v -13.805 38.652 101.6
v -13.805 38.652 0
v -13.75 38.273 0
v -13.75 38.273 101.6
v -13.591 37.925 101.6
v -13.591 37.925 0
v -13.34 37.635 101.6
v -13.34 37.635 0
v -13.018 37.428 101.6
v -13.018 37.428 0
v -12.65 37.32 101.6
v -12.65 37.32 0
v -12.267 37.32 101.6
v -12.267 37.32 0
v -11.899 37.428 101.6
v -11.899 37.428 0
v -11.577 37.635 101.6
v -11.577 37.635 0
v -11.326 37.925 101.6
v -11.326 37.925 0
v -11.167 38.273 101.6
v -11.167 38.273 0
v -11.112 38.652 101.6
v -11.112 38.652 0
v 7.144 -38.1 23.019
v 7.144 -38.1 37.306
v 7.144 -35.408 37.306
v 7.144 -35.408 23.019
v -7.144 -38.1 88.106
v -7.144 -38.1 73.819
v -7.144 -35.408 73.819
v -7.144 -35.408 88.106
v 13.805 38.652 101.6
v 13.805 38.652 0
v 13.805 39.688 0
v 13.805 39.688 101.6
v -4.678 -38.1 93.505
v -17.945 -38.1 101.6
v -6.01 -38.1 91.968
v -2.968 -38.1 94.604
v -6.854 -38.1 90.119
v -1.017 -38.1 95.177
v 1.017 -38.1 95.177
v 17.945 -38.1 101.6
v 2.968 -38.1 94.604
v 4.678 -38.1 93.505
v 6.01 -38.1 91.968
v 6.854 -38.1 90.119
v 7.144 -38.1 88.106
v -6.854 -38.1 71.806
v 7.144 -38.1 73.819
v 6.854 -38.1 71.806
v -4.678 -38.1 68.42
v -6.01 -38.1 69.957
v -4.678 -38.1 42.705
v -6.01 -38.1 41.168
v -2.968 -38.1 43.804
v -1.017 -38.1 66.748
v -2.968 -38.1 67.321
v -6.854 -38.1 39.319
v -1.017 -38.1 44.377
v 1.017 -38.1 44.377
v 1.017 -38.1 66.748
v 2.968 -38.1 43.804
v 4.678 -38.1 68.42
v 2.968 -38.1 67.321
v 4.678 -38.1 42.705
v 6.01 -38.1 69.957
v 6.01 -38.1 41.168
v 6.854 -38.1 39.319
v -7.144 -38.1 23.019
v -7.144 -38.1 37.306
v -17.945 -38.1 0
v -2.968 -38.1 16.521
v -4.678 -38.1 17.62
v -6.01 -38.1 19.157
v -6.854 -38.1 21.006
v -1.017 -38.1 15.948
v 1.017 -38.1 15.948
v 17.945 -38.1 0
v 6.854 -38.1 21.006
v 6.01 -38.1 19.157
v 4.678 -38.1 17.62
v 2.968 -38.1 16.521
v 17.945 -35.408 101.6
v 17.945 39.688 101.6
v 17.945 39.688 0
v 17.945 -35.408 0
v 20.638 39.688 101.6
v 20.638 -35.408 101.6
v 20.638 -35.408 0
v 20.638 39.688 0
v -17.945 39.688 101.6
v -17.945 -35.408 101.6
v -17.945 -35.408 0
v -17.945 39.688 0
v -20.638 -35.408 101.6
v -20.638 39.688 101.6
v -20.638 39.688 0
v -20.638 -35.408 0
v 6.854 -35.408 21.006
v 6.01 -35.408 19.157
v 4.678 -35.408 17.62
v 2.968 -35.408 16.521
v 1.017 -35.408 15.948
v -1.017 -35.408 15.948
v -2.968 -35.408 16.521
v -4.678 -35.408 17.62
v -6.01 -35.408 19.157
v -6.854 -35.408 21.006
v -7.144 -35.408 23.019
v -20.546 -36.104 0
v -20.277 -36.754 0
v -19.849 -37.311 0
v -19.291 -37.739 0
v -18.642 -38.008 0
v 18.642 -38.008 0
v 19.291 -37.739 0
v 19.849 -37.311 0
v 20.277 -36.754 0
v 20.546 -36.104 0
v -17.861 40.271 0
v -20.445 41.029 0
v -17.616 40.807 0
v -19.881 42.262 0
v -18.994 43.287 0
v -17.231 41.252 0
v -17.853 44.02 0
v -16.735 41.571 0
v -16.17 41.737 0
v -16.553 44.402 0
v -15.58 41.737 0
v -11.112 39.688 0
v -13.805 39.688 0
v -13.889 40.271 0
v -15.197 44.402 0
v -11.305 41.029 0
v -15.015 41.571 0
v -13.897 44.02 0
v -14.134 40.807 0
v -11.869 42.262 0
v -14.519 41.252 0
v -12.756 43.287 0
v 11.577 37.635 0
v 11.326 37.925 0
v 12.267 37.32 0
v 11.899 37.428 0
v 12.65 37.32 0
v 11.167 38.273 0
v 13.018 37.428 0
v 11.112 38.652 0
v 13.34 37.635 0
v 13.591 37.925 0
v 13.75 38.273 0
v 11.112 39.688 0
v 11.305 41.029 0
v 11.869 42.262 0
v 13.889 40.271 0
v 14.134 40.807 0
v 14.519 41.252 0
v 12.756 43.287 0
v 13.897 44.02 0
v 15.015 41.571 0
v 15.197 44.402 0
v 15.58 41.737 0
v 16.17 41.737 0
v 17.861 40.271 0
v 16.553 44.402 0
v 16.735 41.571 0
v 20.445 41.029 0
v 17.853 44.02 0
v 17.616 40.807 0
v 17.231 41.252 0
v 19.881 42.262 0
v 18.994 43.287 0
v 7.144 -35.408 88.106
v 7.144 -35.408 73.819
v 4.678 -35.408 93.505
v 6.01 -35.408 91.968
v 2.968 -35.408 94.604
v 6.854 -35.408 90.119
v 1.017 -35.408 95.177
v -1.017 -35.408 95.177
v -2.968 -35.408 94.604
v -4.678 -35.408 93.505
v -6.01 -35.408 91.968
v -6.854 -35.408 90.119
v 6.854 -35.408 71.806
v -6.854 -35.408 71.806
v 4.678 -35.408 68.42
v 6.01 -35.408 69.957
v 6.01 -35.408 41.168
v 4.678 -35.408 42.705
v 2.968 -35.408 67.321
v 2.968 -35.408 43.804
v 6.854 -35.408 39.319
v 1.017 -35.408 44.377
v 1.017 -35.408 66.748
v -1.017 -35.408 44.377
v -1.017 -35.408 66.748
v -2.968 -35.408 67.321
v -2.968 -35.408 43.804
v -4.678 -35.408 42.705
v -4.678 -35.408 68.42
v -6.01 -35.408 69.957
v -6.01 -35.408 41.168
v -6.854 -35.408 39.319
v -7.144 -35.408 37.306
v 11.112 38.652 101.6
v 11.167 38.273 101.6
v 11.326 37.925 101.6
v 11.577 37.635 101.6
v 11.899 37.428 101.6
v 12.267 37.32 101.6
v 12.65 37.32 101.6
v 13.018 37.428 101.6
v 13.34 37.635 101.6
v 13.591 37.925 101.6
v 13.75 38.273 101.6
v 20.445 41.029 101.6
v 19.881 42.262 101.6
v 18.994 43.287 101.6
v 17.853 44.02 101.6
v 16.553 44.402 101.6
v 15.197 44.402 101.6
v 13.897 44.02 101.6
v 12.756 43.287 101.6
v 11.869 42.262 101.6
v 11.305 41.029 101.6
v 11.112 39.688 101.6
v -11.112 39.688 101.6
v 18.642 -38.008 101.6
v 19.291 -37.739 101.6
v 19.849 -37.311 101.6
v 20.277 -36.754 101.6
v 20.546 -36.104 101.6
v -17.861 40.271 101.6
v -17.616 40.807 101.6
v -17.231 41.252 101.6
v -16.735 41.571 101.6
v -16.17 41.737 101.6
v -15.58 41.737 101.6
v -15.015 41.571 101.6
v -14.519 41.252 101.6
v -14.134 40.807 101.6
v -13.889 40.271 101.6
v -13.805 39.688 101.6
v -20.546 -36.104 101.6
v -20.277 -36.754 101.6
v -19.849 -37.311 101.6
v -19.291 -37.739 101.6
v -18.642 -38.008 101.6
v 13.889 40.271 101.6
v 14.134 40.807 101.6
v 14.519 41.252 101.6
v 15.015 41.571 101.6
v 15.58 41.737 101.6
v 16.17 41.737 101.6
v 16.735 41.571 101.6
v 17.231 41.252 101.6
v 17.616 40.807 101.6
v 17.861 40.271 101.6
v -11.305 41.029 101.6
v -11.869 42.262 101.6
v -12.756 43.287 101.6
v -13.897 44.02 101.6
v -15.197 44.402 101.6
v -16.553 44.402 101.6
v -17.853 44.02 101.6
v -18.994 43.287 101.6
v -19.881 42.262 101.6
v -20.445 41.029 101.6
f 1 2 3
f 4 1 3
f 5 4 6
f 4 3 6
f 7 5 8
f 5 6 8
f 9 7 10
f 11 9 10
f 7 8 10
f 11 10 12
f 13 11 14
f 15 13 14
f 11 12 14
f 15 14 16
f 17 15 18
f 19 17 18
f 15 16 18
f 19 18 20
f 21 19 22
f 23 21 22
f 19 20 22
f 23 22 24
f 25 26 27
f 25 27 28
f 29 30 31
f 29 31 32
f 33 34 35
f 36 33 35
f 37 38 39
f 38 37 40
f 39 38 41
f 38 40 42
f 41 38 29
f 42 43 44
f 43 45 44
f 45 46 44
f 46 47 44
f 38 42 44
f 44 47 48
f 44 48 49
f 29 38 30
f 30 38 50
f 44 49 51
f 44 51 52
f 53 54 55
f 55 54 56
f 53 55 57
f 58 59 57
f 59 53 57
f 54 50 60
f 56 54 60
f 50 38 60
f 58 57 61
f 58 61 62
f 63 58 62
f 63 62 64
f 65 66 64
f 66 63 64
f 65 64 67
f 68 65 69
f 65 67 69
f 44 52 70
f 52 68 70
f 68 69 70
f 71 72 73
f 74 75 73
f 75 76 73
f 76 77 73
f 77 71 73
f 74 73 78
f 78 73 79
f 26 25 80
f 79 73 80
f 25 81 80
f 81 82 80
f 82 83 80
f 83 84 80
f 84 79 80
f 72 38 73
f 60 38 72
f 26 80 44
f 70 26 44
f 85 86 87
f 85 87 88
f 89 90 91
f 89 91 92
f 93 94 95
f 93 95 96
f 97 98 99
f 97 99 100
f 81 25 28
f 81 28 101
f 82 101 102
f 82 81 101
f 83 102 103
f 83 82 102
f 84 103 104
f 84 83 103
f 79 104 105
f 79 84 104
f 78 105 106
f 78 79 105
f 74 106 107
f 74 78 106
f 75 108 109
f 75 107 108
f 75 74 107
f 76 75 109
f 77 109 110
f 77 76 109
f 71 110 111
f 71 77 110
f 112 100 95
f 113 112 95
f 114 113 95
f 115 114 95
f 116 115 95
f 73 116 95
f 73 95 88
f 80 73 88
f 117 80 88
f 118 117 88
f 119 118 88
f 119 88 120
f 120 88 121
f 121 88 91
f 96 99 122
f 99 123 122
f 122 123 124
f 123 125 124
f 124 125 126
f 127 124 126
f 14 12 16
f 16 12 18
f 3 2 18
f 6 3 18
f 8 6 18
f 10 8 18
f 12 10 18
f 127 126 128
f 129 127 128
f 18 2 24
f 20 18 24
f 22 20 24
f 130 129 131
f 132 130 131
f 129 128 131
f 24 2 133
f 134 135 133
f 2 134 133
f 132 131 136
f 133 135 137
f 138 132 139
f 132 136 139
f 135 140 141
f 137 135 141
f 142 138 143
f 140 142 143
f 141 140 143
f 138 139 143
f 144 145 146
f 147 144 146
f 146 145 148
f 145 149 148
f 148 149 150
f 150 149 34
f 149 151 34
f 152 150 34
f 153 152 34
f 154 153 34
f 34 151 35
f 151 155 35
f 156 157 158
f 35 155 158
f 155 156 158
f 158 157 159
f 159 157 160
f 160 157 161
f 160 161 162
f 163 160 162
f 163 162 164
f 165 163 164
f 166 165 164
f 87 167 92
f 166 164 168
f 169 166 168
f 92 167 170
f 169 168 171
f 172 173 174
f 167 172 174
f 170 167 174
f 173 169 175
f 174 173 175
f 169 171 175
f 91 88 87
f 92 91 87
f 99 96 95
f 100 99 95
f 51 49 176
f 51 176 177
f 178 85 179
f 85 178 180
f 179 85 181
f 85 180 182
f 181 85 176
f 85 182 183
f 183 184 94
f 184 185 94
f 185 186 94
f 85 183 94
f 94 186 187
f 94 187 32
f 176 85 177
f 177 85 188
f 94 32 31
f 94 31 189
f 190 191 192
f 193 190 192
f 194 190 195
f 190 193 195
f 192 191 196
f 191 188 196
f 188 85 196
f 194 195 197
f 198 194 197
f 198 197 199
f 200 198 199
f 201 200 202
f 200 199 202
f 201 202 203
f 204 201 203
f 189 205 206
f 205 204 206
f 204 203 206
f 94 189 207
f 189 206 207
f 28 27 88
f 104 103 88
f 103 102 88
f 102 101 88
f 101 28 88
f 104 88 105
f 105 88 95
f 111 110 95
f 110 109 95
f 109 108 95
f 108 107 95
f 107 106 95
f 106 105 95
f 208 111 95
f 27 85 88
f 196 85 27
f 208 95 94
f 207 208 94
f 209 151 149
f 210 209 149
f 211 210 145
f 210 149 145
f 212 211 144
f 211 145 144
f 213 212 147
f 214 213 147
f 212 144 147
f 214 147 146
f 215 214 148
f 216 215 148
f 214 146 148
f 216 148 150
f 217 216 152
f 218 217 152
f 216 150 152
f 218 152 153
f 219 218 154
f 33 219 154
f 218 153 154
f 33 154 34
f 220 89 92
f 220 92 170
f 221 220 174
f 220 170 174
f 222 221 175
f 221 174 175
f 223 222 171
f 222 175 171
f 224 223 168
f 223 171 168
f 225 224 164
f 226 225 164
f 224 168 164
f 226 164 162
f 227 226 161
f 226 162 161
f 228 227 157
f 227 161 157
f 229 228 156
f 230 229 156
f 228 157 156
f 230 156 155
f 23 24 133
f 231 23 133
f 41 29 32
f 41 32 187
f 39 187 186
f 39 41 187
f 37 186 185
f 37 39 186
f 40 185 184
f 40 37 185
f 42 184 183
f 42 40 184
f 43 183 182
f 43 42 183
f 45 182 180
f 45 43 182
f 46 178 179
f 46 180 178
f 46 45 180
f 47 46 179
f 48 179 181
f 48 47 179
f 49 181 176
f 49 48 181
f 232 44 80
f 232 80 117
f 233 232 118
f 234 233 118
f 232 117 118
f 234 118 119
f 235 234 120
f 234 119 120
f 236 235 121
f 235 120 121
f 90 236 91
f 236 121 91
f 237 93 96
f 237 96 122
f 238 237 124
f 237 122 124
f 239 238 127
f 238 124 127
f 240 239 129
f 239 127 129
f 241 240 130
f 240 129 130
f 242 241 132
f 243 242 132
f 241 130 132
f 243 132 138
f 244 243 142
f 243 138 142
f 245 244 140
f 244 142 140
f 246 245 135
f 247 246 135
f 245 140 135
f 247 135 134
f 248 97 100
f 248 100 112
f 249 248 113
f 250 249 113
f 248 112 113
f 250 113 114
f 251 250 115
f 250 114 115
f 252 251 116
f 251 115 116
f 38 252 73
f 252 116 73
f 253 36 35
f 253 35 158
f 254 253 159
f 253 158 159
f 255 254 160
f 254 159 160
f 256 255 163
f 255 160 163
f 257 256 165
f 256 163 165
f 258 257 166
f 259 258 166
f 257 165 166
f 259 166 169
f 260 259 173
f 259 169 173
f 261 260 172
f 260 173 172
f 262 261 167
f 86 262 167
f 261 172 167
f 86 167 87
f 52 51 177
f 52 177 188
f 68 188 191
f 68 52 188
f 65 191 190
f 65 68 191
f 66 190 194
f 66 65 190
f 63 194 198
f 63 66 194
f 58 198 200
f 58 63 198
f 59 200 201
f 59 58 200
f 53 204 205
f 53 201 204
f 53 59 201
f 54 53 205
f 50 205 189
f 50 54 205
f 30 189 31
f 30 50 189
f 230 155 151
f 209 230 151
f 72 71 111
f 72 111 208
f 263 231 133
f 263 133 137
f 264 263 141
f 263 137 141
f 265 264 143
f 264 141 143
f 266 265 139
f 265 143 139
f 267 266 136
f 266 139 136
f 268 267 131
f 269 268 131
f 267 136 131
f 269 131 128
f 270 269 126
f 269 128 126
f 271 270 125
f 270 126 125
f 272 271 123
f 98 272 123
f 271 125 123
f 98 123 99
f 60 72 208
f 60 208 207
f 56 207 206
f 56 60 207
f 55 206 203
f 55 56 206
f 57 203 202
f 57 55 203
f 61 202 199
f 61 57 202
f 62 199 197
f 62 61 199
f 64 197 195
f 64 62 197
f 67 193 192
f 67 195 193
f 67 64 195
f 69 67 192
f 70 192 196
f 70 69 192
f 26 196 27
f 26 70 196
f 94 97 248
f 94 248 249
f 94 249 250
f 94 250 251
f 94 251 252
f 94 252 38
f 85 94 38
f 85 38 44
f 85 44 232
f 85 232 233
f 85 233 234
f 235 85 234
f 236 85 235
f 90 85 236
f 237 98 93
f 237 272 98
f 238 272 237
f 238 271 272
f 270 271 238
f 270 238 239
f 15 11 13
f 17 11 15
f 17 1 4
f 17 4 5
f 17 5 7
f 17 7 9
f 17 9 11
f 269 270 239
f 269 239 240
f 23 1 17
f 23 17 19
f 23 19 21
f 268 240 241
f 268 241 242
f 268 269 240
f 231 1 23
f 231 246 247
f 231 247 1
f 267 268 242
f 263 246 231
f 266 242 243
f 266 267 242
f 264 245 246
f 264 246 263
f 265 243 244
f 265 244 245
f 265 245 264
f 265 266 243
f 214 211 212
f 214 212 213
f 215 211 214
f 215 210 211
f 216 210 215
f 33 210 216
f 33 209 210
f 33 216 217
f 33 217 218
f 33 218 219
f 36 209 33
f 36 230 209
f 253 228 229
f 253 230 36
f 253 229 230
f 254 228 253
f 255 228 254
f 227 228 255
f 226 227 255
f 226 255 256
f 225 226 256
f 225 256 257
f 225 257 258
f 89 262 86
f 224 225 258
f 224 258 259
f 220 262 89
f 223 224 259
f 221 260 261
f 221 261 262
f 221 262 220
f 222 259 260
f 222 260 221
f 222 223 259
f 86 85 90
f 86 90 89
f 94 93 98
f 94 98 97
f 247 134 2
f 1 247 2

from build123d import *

# Parameters (mm, degrees)
BASE_EXTRUDE_DEPTH = 101.6
SLOT_DEPTH         = 145.160282621
LPATTERN1_COUNT    = 2
LPATTERN1_PITCH    = 50.8


with BuildPart() as part:
    # Sketch1 → Base-Extrude (new body)
    with BuildSketch(Plane.XY):
        with BuildLine():
            Line((-20.6375, 39.6875), (-20.6375, -35.4076))
            ThreePointArc((-20.6375, -35.4076), (-19.848914298, -37.311414298), (-17.9451, -38.1))
            Line((-17.9451, -38.1), (17.9451, -38.1))
            ThreePointArc((17.9451, -38.1), (19.848914298, -37.311414298), (20.6375, -35.4076))
            Line((20.6375, -35.4076), (20.6375, 39.6875))
            ThreePointArc((20.6375, 39.6875), (15.875, 44.45), (11.1125, 39.6875))
            Line((11.1125, 39.6875), (11.1125, 38.65245))
            ThreePointArc((11.1125, 38.65245), (12.4587, 37.30625), (13.8049, 38.65245))
            Line((13.8049, 38.65245), (13.8049, 39.6875))
            ThreePointArc((13.8049, 39.6875), (15.875, 41.7576), (17.9451, 39.6875))
            Line((17.9451, 39.6875), (17.9451, -35.4076))
            Line((17.9451, -35.4076), (-17.9451, -35.4076))
            Line((-17.9451, -35.4076), (-17.9451, 39.6875))
            ThreePointArc((-17.9451, 39.6875), (-15.875, 41.7576), (-13.8049, 39.6875))
            Line((-13.8049, 39.6875), (-13.8049, 38.65245))
            ThreePointArc((-13.8049, 38.65245), (-12.4587, 37.30625), (-11.1125, 38.65245))
            Line((-11.1125, 38.65245), (-11.1125, 39.6875))
            ThreePointArc((-11.1125, 39.6875), (-15.875, 44.45), (-20.6375, 39.6875))
        make_face()
    extrude(amount=BASE_EXTRUDE_DEPTH)

    # Sketch2 → Slot (cut, through all)
    with BuildSketch(Plane(origin=(-0.560706402, -38.1, -14.668313098), x_dir=(1, 0, 0), z_dir=(0, -1, 0))):
        with BuildLine():
            Line((7.704456402, 51.974563098), (7.704456402, 37.687063098))
            ThreePointArc((7.704456402, 37.687063098), (0.560706402, 30.543313098), (-6.583043598, 37.687063098))
            Line((-6.583043598, 37.687063098), (-6.583043598, 51.974563098))
            ThreePointArc((-6.583043598, 51.974563098), (0.560706402, 59.118313098), (7.704456402, 51.974563098))
        make_face()
    slot = extrude(amount=-SLOT_DEPTH, mode=Mode.SUBTRACT)

    # LPattern1: Slot ×2
    with Locations(*[(0, 0, i * LPATTERN1_PITCH) for i in range(1, LPATTERN1_COUNT)]):
        add(slot, mode=Mode.SUBTRACT)


solid = part.part
